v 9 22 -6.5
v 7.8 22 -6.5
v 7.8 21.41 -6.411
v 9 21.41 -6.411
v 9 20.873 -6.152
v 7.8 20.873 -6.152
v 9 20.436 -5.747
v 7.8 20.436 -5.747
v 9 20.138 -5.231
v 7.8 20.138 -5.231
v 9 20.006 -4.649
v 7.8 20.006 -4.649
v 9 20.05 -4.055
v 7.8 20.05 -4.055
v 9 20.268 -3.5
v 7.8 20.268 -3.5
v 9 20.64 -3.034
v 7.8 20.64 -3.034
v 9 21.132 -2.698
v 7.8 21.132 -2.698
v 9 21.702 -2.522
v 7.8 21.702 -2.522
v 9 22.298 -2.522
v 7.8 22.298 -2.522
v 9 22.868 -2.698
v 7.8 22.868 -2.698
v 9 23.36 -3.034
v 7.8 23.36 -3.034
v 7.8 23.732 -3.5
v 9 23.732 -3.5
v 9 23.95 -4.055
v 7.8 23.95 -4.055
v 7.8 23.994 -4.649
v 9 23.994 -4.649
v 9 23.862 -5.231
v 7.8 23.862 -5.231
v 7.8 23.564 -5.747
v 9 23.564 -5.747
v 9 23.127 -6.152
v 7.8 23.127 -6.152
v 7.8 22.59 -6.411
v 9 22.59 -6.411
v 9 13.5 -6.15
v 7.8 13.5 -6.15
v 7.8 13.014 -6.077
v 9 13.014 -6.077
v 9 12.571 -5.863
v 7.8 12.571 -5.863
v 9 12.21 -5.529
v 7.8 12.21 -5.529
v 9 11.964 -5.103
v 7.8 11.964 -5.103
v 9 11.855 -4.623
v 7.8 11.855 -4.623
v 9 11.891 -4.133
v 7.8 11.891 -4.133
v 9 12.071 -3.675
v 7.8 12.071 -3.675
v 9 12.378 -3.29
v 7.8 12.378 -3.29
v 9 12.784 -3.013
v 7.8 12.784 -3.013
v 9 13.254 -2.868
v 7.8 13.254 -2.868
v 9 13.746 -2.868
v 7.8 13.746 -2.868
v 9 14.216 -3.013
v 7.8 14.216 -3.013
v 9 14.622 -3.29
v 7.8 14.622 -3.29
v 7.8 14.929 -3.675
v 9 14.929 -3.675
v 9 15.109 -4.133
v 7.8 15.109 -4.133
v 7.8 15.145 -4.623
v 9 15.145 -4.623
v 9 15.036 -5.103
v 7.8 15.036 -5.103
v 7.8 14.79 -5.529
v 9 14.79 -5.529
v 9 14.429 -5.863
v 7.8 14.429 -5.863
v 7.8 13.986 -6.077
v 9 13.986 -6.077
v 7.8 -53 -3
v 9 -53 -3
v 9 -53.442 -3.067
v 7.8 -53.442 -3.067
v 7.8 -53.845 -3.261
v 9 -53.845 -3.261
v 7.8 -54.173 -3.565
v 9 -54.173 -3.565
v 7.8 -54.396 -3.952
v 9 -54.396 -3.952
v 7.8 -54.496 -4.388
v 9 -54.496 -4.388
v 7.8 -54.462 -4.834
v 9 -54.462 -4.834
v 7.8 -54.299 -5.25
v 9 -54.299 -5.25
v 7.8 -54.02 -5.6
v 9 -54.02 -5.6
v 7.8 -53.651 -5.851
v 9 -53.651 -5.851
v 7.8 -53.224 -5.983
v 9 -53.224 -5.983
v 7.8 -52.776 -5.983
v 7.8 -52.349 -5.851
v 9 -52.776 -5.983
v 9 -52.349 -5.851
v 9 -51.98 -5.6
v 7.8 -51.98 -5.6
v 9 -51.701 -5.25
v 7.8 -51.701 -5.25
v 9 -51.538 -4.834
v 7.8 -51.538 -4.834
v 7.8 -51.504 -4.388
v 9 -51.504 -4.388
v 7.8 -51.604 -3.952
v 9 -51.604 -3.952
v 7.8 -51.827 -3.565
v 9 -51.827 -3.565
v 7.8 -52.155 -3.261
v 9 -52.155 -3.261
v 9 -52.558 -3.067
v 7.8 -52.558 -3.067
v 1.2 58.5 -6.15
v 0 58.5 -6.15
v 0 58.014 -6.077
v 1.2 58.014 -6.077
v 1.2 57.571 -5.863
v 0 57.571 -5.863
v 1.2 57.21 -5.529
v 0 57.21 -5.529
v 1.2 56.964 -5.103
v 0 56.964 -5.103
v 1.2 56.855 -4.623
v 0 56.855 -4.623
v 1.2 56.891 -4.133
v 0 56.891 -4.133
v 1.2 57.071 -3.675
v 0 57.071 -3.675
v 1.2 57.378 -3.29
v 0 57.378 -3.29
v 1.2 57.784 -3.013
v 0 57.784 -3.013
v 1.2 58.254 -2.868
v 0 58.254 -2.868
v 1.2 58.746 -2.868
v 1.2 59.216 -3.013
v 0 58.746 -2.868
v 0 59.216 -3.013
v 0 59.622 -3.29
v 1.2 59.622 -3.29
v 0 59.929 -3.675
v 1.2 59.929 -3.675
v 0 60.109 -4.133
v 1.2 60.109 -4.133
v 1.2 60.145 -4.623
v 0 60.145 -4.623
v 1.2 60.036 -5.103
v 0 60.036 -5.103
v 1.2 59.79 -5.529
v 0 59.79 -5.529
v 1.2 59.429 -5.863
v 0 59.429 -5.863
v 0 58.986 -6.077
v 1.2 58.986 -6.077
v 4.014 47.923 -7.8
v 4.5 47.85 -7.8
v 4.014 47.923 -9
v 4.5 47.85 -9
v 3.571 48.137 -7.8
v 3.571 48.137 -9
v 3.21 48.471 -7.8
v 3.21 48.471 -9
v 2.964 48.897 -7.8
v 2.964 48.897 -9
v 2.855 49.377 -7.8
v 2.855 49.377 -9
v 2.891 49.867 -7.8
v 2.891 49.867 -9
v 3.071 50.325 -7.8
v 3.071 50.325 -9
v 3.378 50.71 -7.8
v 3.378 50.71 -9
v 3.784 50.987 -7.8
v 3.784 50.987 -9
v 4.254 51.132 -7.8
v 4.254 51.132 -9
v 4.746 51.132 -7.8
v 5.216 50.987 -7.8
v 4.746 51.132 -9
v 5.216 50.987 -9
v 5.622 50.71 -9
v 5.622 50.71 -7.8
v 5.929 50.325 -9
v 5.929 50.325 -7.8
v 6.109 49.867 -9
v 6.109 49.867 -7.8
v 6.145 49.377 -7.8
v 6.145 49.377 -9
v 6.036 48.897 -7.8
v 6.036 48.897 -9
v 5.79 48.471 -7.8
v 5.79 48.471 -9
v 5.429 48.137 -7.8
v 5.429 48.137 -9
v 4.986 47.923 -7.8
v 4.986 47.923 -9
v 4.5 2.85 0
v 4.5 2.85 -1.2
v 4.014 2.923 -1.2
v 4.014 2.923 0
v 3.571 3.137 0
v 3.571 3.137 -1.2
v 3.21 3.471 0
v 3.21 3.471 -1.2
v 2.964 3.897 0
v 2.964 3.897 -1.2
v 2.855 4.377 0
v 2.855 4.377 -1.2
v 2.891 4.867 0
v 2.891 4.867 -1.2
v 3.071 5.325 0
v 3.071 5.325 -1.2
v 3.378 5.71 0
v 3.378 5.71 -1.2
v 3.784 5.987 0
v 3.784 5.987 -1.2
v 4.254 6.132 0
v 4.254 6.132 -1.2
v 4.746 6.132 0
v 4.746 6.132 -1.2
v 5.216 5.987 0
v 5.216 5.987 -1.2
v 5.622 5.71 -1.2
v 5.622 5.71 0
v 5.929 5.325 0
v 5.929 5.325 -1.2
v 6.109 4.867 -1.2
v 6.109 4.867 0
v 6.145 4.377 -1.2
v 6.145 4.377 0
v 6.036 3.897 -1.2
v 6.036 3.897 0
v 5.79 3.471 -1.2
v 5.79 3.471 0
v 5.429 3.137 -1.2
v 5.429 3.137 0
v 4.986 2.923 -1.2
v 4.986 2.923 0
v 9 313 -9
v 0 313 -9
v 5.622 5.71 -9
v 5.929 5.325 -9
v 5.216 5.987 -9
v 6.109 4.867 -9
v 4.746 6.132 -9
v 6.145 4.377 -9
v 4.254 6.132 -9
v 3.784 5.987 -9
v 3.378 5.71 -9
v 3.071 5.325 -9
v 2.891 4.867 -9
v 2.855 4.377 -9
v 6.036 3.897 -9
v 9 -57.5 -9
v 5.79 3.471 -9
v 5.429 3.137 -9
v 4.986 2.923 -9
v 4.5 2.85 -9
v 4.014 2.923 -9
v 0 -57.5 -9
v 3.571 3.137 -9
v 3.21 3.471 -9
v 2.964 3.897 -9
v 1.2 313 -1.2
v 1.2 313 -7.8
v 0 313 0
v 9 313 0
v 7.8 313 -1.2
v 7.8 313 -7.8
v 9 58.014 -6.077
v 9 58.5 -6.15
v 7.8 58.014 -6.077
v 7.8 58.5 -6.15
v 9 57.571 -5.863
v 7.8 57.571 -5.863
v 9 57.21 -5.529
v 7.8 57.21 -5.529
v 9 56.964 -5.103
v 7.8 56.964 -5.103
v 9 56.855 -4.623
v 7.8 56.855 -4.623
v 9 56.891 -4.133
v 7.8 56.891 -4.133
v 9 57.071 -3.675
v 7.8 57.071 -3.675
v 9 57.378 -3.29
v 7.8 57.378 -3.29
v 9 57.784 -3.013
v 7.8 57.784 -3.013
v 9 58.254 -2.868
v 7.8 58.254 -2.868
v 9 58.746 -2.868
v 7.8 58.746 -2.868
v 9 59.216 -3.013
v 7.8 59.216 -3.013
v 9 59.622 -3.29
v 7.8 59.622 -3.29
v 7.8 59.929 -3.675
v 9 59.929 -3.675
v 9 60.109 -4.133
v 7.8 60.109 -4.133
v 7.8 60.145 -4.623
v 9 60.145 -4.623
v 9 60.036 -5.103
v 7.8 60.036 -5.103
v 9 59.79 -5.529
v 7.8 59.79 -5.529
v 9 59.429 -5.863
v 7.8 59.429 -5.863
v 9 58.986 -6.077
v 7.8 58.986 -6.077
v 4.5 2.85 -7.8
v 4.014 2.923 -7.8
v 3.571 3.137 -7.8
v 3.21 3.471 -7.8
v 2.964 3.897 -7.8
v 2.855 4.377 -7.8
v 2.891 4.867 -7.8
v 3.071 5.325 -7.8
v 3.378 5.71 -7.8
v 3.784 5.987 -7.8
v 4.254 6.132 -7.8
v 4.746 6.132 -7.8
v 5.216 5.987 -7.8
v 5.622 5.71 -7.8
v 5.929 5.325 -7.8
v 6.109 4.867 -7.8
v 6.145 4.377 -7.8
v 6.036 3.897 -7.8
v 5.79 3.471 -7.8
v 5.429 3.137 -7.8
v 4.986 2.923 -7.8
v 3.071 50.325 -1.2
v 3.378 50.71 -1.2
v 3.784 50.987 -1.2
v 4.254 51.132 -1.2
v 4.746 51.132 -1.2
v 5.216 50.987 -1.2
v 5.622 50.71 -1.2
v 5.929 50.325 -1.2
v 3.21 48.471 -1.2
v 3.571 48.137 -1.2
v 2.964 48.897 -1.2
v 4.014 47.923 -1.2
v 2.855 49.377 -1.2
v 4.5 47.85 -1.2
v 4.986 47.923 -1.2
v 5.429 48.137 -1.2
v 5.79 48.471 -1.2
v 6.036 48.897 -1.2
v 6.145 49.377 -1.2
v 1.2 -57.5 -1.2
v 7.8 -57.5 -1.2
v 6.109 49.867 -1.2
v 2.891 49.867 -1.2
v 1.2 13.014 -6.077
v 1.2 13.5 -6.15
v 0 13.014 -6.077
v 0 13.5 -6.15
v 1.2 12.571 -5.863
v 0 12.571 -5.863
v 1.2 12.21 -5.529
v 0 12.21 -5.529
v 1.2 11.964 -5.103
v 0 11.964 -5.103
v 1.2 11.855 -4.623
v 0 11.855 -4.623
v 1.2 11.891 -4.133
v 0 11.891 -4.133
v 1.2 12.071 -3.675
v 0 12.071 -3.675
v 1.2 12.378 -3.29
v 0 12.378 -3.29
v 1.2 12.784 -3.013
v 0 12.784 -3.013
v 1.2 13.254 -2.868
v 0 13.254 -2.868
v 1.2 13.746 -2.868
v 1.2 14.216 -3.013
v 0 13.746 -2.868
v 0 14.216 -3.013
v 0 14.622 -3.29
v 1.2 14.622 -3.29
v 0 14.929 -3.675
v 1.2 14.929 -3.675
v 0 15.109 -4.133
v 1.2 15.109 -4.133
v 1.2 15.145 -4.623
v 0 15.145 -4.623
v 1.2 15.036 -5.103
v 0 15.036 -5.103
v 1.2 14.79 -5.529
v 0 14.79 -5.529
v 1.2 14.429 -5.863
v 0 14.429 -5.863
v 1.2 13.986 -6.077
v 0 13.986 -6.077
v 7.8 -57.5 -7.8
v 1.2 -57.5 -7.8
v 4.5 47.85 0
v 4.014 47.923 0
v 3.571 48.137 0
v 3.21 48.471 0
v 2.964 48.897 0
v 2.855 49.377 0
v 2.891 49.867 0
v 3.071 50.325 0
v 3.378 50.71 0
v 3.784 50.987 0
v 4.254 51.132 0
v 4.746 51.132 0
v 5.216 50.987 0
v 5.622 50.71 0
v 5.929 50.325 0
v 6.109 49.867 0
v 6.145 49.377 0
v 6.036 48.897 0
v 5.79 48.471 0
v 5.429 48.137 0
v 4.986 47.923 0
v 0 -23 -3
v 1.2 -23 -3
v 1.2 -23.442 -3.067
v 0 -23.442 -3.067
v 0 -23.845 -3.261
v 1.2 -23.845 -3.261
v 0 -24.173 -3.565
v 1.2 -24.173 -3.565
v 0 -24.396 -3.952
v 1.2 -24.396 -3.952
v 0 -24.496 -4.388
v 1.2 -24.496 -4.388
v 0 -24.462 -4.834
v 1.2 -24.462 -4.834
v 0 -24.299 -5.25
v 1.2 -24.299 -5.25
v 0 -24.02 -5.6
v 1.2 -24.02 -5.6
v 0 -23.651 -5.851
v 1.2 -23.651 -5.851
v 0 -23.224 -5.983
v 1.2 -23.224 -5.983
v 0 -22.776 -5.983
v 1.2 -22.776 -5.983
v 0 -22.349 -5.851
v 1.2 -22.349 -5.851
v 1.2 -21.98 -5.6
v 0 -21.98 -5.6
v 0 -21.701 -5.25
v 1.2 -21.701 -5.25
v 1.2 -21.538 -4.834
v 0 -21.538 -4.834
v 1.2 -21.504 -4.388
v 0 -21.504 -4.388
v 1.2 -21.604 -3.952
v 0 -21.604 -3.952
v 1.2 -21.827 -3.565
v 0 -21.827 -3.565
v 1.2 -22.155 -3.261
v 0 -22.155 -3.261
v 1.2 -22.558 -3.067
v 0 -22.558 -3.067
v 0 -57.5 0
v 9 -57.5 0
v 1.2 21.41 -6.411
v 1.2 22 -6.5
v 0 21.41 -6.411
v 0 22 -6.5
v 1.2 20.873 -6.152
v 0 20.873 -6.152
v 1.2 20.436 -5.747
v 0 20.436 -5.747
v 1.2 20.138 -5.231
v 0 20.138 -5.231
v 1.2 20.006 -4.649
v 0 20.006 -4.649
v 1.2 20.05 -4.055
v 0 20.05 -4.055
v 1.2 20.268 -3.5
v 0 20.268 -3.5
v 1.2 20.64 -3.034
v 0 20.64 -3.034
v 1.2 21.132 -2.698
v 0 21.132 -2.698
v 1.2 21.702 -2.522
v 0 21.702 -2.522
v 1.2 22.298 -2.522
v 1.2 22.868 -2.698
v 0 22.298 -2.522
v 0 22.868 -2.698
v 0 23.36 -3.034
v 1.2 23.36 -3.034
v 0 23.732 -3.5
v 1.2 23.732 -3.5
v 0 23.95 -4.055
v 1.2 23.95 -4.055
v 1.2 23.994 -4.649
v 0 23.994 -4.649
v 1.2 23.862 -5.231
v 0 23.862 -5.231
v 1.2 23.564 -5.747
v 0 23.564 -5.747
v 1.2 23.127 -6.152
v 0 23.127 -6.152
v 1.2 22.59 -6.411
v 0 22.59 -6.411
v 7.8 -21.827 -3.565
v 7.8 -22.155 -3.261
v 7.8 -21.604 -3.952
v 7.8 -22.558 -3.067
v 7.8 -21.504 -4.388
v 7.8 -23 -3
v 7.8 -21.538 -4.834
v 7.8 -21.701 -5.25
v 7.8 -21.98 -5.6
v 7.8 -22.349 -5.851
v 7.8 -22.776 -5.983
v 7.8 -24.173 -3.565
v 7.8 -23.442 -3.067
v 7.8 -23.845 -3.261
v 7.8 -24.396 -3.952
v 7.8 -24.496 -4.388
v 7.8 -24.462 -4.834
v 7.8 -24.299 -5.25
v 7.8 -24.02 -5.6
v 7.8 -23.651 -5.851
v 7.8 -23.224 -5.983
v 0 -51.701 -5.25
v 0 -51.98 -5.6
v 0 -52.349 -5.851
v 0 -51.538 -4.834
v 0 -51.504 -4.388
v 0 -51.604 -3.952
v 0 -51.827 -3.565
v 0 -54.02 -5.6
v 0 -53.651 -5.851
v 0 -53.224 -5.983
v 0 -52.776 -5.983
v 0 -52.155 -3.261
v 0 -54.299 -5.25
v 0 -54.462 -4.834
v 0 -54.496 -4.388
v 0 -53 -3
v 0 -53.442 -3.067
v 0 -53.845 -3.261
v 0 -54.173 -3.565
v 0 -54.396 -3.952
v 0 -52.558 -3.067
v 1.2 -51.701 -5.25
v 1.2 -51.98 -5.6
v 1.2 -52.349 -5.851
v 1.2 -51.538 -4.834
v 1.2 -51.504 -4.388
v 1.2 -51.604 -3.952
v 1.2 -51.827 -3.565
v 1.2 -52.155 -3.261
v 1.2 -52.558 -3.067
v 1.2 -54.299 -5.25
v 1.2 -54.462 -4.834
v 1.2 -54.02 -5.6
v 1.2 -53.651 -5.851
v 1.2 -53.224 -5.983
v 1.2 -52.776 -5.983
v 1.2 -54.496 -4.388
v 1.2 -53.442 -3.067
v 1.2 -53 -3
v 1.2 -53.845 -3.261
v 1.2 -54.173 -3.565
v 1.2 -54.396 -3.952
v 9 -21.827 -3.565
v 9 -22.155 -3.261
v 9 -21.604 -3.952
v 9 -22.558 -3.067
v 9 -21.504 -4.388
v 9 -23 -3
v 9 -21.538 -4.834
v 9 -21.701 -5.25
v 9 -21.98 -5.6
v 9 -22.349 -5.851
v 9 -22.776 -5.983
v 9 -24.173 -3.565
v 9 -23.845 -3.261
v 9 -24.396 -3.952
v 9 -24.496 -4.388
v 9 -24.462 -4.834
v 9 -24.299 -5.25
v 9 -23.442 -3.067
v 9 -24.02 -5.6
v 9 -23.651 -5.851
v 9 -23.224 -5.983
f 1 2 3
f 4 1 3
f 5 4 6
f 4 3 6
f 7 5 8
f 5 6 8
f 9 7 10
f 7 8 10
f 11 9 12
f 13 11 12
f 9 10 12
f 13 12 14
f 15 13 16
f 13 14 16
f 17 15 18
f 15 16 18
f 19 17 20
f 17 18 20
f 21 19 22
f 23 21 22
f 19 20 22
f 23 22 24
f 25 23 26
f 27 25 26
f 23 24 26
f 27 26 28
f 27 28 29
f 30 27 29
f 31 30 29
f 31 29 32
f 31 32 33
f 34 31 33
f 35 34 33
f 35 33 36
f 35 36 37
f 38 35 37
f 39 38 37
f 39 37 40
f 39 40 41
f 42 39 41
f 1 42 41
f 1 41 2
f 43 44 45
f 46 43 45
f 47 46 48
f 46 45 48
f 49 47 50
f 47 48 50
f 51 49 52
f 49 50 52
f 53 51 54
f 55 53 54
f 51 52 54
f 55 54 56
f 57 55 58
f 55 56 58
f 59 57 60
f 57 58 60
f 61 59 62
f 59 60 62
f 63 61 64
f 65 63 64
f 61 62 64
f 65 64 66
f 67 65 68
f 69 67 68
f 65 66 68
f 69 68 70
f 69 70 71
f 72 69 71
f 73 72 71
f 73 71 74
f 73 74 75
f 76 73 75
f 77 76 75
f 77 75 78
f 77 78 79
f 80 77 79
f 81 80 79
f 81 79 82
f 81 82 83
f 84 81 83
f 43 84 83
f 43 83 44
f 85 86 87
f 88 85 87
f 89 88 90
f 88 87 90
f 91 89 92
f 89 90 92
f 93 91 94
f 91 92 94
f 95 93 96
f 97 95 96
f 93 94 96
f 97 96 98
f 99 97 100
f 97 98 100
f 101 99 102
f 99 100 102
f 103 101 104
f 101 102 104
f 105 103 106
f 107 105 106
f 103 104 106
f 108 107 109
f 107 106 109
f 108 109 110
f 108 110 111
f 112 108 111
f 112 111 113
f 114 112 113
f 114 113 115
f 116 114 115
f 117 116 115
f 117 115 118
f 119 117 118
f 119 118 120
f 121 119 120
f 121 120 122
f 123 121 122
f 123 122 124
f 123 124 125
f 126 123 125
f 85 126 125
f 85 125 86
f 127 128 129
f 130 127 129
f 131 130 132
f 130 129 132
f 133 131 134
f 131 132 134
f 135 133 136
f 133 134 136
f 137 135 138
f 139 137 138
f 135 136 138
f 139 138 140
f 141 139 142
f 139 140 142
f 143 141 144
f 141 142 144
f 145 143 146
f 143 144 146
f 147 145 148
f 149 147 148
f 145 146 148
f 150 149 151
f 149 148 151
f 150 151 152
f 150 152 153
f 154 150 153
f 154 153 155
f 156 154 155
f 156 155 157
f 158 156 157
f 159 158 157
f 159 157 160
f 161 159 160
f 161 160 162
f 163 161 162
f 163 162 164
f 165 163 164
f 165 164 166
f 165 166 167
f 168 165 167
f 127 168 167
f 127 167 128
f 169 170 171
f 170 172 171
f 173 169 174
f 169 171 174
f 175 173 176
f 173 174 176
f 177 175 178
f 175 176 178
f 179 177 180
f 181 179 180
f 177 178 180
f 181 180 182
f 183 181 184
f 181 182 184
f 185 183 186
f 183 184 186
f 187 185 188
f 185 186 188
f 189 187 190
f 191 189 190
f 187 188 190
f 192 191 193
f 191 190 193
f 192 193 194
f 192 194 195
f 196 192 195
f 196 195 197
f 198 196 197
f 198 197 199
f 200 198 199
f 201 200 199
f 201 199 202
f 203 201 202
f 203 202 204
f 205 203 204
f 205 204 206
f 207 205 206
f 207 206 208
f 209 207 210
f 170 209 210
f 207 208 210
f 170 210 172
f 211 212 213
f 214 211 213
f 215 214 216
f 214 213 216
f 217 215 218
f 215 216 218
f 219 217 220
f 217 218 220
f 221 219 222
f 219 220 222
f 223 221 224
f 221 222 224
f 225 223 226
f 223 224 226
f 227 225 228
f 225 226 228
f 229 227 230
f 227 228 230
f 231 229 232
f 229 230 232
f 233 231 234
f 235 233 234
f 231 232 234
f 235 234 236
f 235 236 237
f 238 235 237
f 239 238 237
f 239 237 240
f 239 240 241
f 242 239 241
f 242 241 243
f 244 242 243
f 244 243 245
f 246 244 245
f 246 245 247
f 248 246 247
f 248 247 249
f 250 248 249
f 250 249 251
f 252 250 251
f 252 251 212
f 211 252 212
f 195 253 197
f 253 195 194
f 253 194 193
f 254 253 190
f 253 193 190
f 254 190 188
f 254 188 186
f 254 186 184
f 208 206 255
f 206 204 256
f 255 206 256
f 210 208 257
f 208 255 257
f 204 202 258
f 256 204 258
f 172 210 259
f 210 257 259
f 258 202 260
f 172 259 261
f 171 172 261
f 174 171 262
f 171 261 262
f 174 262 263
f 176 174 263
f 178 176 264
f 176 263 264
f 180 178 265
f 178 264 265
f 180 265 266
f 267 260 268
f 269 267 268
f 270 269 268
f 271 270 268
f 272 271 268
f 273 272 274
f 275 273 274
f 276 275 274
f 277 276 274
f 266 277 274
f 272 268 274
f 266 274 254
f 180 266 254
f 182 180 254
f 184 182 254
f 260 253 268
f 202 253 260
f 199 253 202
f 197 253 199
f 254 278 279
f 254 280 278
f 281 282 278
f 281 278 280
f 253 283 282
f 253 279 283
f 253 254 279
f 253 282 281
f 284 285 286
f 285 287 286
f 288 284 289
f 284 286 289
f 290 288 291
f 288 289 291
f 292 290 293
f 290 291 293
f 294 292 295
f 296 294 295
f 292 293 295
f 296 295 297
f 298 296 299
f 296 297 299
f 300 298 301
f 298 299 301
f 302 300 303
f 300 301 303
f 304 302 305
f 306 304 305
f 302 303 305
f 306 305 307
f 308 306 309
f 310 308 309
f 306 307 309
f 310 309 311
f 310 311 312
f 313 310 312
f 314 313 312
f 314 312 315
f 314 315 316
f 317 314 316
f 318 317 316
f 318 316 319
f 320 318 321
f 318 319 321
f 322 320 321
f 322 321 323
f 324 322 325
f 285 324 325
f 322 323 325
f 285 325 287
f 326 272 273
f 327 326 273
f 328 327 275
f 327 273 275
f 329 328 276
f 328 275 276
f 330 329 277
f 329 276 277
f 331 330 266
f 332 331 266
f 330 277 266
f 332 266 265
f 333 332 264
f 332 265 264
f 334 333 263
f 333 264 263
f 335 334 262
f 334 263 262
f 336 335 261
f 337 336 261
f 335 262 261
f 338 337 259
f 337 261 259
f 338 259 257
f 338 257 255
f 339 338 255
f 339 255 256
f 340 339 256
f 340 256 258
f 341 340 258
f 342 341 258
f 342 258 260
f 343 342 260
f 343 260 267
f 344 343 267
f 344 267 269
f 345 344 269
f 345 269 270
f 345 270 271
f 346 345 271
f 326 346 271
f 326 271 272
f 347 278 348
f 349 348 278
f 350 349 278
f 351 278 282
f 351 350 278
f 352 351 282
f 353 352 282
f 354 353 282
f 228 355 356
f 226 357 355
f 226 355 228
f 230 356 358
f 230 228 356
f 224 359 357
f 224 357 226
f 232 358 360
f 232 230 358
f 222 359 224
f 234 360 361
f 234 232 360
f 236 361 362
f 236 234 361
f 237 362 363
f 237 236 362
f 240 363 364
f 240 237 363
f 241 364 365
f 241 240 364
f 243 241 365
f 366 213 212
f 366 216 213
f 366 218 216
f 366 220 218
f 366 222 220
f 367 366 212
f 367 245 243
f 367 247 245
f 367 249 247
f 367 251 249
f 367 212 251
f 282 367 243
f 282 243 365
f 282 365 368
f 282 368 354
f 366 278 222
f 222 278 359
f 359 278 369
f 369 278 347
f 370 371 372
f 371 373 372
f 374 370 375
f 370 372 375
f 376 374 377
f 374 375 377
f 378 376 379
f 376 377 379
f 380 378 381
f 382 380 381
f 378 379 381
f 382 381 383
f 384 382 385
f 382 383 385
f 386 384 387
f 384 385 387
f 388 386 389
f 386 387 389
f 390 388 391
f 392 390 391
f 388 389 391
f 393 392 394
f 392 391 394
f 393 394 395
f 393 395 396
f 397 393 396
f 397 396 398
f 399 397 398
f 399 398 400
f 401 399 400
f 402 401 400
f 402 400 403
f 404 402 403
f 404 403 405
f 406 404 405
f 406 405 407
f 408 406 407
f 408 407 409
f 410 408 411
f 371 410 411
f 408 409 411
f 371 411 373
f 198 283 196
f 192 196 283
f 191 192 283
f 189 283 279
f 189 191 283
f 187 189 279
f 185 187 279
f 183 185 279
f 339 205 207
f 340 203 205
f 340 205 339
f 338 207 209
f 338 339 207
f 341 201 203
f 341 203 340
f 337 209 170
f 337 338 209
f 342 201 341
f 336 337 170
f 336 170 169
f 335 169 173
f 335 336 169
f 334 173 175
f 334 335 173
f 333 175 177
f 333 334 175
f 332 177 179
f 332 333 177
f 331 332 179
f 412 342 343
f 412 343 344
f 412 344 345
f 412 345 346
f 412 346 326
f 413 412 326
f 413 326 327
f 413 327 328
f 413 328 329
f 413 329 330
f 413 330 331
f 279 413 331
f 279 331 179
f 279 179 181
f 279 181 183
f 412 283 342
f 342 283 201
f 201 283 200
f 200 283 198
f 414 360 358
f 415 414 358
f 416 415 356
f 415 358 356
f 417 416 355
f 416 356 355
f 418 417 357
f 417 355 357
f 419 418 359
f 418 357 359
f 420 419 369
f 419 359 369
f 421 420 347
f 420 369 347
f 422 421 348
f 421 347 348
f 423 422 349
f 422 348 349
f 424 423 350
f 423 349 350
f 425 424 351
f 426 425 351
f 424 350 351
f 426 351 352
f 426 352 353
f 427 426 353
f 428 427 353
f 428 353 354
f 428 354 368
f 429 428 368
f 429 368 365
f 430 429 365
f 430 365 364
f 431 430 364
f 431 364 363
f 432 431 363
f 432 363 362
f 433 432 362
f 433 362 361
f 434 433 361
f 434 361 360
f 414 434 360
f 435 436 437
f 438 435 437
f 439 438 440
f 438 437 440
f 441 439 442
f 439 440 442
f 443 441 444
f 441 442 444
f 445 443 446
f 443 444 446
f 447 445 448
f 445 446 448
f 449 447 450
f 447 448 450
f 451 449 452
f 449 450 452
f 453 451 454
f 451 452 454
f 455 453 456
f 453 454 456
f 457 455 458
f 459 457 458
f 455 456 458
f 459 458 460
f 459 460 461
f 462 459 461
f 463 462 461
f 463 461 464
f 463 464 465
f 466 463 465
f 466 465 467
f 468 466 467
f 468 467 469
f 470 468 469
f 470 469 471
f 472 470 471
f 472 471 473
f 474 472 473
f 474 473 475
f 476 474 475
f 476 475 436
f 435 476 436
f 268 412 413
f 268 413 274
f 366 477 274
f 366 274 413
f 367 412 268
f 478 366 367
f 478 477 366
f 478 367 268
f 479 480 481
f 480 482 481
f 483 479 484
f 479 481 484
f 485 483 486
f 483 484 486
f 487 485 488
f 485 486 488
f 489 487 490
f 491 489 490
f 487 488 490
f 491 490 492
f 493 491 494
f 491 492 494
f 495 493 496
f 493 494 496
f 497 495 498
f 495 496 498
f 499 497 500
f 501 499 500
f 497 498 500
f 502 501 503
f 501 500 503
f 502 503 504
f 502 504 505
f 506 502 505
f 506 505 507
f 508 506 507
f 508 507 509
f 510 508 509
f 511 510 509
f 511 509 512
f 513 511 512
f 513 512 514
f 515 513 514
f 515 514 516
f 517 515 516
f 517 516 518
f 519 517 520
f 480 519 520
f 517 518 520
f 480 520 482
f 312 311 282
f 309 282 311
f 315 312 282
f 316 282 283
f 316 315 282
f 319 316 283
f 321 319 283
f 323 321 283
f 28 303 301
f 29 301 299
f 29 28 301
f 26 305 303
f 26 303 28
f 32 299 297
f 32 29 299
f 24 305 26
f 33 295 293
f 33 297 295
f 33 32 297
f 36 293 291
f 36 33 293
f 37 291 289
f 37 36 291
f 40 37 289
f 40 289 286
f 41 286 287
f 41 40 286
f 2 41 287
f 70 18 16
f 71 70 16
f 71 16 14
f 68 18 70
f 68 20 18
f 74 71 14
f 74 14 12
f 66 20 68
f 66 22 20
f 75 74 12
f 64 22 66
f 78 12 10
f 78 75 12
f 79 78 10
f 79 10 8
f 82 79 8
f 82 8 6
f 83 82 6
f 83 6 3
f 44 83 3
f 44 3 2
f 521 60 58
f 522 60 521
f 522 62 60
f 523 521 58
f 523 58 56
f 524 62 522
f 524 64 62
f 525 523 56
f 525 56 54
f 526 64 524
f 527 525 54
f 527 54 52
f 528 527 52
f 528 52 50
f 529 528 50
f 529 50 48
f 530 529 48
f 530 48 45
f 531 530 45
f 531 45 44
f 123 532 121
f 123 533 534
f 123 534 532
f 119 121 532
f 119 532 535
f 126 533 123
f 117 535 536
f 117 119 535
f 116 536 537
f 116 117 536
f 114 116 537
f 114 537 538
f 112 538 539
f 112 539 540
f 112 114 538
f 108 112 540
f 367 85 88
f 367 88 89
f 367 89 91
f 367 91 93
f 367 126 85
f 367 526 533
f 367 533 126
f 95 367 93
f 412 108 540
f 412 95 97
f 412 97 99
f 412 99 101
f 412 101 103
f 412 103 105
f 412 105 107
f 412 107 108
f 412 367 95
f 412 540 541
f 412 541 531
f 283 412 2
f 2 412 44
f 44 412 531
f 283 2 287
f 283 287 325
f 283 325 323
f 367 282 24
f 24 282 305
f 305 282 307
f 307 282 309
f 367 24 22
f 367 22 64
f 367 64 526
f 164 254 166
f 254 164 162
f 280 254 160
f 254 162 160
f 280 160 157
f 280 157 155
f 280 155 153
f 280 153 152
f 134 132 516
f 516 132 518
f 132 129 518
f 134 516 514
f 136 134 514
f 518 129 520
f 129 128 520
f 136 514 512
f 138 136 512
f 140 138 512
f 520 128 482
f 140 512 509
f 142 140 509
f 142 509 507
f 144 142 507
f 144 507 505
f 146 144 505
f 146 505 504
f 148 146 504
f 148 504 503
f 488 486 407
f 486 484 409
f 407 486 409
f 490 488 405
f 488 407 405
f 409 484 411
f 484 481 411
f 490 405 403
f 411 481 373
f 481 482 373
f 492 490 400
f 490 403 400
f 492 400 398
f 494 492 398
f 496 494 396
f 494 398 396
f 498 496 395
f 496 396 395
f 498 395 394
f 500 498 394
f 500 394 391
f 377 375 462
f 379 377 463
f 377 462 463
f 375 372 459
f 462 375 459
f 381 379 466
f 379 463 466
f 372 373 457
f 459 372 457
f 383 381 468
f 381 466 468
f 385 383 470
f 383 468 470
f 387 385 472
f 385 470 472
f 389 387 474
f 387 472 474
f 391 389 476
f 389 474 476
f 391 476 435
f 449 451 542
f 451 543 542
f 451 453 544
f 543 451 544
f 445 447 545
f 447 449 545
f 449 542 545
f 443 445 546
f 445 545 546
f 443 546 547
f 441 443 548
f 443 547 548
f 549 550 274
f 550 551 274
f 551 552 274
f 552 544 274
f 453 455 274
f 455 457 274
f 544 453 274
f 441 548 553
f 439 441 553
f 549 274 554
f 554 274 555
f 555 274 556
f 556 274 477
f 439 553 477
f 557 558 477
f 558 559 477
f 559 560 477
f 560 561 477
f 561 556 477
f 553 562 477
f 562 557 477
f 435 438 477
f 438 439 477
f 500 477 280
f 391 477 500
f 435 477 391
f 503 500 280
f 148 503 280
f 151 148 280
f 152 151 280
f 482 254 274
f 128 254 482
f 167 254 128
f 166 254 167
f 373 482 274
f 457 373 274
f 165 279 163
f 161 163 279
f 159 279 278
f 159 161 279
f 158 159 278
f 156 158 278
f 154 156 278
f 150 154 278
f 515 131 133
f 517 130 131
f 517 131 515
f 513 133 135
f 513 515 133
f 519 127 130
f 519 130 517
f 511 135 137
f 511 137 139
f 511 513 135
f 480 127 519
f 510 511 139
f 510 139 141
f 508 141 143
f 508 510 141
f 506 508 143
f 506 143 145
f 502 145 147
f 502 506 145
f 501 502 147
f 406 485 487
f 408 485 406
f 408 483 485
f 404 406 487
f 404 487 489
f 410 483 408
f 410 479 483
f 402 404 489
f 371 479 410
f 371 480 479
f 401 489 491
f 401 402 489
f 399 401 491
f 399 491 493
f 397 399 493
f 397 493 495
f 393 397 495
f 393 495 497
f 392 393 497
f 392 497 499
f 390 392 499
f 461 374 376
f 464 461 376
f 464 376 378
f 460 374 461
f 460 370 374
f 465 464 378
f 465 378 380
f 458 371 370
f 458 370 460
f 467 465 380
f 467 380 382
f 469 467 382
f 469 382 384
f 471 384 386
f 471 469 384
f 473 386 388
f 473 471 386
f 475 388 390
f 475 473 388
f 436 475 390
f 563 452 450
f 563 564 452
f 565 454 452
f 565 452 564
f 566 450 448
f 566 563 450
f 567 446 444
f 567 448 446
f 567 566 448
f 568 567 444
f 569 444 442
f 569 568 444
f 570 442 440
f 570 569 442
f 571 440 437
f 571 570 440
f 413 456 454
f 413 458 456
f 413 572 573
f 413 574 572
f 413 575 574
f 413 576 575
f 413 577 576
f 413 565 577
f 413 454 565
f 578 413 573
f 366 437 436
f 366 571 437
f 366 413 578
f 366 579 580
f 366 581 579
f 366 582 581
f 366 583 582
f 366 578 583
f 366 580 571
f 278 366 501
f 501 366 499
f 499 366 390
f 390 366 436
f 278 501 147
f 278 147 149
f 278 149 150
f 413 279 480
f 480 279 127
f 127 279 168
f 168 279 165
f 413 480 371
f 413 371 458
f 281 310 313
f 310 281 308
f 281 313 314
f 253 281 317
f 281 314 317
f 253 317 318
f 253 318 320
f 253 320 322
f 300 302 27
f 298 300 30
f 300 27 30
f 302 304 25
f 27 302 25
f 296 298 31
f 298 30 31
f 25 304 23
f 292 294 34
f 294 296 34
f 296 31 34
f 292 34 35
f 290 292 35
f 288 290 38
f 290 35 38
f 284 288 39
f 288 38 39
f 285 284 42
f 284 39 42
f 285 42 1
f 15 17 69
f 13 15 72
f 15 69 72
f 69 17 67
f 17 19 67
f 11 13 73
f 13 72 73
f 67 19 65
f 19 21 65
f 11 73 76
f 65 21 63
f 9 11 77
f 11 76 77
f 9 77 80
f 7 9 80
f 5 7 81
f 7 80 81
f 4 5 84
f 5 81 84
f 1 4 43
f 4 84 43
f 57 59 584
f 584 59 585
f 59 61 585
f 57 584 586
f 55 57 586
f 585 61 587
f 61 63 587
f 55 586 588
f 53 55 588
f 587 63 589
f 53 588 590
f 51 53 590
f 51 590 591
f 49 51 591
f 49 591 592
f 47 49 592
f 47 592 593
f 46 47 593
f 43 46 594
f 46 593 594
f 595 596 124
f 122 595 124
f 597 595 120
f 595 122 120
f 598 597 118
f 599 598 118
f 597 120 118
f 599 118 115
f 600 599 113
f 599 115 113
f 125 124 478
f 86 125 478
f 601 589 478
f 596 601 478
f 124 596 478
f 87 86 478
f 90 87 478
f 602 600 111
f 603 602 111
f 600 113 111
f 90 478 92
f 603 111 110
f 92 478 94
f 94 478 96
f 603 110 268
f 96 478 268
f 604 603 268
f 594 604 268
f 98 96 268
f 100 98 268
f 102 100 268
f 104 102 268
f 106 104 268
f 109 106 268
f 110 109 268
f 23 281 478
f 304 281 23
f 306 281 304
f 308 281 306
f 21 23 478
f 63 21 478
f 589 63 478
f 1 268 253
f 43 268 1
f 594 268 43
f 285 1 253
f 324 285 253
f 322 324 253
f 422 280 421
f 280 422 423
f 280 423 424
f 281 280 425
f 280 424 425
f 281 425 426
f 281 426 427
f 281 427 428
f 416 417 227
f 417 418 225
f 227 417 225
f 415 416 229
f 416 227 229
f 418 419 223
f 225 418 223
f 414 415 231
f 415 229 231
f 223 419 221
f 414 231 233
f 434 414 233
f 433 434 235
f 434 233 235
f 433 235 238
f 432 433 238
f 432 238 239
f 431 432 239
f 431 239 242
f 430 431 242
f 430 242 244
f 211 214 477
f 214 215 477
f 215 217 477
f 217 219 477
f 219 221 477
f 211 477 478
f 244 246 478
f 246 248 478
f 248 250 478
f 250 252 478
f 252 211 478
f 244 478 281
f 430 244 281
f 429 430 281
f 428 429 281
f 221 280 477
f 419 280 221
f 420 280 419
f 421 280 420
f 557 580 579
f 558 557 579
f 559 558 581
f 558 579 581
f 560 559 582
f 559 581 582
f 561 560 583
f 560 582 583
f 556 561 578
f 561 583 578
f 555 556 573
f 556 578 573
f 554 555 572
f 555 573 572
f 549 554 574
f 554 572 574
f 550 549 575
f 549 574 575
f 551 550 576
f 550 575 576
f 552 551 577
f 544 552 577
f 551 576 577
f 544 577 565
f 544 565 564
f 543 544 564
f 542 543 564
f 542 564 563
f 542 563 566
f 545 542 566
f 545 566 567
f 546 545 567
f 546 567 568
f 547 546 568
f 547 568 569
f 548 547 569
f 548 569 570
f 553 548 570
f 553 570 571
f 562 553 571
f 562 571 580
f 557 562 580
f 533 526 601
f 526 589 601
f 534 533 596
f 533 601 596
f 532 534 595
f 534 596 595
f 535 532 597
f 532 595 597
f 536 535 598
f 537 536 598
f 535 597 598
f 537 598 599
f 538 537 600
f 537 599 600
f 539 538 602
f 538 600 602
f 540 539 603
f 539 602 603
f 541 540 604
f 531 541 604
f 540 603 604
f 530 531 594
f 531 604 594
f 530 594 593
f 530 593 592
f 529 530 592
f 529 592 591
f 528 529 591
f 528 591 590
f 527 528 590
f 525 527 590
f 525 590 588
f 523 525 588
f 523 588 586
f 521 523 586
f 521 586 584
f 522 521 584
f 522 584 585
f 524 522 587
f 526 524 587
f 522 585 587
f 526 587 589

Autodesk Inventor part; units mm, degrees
ref_plane "YZ Plane" through (0, 0, 0) normal (1, 0, 0) x (0, 1, 0)
ref_plane "XZ Plane" through (0, 0, 0) normal (0, 1, 0) x (-1, 0, 0)
ref_plane "XY Plane" through (0, 0, 0) normal (0, 0, 1) x (1, 0, 0)
sketch "スケッチ1" plane through (0, 0, 0) normal (0, 1, 0) x (-1, 0, 0)
  line L0 (0, 0) -> (-9, 0)
  line L1 (-9, 0) -> (-9, -9)
  line L2 (-9, -9) -> (0, -9)
  line L3 (0, -9) -> (0, 0)
  line L4 (-1.2, -1.2) -> (-7.8, -1.2)
  line L5 (-7.8, -1.2) -> (-7.8, -7.8)
  line L6 (-7.8, -7.8) -> (-1.2, -7.8)
  line L7 (-1.2, -7.8) -> (-1.2, -1.2)
  dimension "d0" = 9
  dimension "d1" = 9
  dimension "d2" = 1.2
  dimension "d3" = 1.2
  dimension "d4" = 1.2
  dimension "d5" = 1.2
extrude "押し出し1" add sketch "スケッチ1" along normal blind 63
sketch "スケッチ2" plane through (9, 0, 0) normal (1, 0, 0) x (0, 0, -1)
  line L0 (0, 63) -> (9, 63) projected
  line L1 (9, 0) -> (9, 63) projected
  line L2 (0, 0) -> (9, 0) projected
  point P0 (4.5, 58.5)
  point P1 (4.5, 13.5)
  dimension "d8" = 4.5
  dimension "d9" = 4.5
  dimension "d10" = 4.5
  dimension "d11" = 13.5
hole "穴1" at (9, 58.5, -4.5) at (9, 13.5, -4.5) direction (-1, 0, 0) diameter 3.3 end through all
sketch "スケッチ3" plane through (0, 0, 0) normal (0, 0, 1) x (1, 0, 0)
  line L0 (0, 0) -> (0, 63) projected
  line L1 (0, 0) -> (9, 0) projected
  line L2 (0, 63) -> (9, 63) projected
  point P0 (4.5, 49.5)
  point P1 (4.5, 4.5)
  dimension "d19" = 4.5
  dimension "d20" = 4.5
  dimension "d21" = 13.5
  dimension "d22" = 4.5
hole "穴2" at (4.5, 49.5, 0) at (4.5, 4.5, 0) direction (0, 0, -1) diameter 3.3 end through all
sketch "スケッチ4" plane through (9, 0, 0) normal (1, 0, 0) x (0, 0, -1)
  line L0 (0, 0) -> (9, 0) projected
  line L1 (9, 0) -> (9, 63) projected
  point P0 (4.5, 22)
  dimension "d30" = 22
  dimension "d31" = 4.5
hole "穴3" at (9, 22, -4.5) direction (-1, 0, 0) diameter 4 end through all
sketch "スケッチ5" plane through (0, 63, 0) normal (0, 1, 0) x (1, 0, 0)
  line L0 (0, 9) -> (0, 0) projected
  line L1 (9, 0) -> (9, 9) projected
  line L2 (0, 0) -> (9, 0)
  line L3 (9, 0) -> (9, 9)
  line L4 (9, 9) -> (0, 9)
  line L5 (0, 9) -> (0, 0)
  line L6 (1.2, 1.2) -> (1.2, 7.8) projected
  line L7 (1.2, 7.8) -> (7.8, 7.8) projected
  line L8 (1.2, 1.2) -> (7.8, 1.2)
  line L9 (7.8, 1.2) -> (7.8, 7.8)
  line L10 (7.8, 7.8) -> (1.2, 7.8)
  line L11 (1.2, 7.8) -> (1.2, 1.2)
extrude "押し出し2" add sketch "スケッチ5" along normal blind 200
sketch "スケッチ6" plane through (0, 0, 0) normal (0, -1, 0) x (1, 0, 0)
  line L0 (0, -9) -> (0, 0) projected
  line L1 (9, 0) -> (9, -9) projected
  line L2 (0, 0) -> (9, 0)
  line L3 (9, 0) -> (9, -9)
  line L4 (9, -9) -> (0, -9)
  line L5 (0, -9) -> (0, 0)
  line L6 (1.2, -1.2) -> (1.2, -7.8) projected
  line L7 (7.8, -7.8) -> (7.8, -1.2) projected
  line L8 (1.2, -1.2) -> (7.8, -1.2)
  line L9 (7.8, -1.2) -> (7.8, -7.8)
  line L10 (7.8, -7.8) -> (1.2, -7.8)
  line L11 (1.2, -7.8) -> (1.2, -1.2)
extrude "押し出し3" add sketch "スケッチ6" along normal blind 57.5
sketch "スケッチ7" plane through (0, 263, -9) normal (-1, 0, 0) x (0, 0, 1)
  line L0 (0, -320.5) -> (0, 0) projected
  line L1 (9, -320.5) -> (0, -320.5) projected
  point P0 (9, -263)
  point P1 (4.5, -316)
  point P2 (4.5, -286)
  dimension "d43" = 4.5
  dimension "d44" = 4.5
  dimension "d45" = 4.5
  dimension "d46" = 30
hole "穴4" at (0, -53, -4.5) at (0, -23, -4.5) direction (1, 0, 0) diameter 3 end through all
sketch "スケッチ8" plane through (0, 263, 0) normal (0, 1, 0) x (1, 0, 0)
  line L0 (0, 0) -> (9, 0)
  line L1 (9, 0) -> (9, 9)
  line L2 (9, 9) -> (0, 9)
  line L3 (0, 9) -> (0, 0)
  line L4 (7.8, 7.8) -> (1.2, 7.8)
  line L5 (1.2, 7.8) -> (1.2, 1.2)
  line L6 (1.2, 1.2) -> (7.8, 1.2)
  line L7 (7.8, 1.2) -> (7.8, 7.8)
extrude "押し出し4" add sketch "スケッチ8" along normal blind 50
equation "\"d4\" = d3"
equation "\"d5\" = d4"
equation "\"d9\" = d8"
equation "\"d10\" = d9"
equation "\"d20\" = d19"
equation "\"d22\" = d19"
properties part number "ハンド9x9_4_CPY" material "アルミニウム 6061"
